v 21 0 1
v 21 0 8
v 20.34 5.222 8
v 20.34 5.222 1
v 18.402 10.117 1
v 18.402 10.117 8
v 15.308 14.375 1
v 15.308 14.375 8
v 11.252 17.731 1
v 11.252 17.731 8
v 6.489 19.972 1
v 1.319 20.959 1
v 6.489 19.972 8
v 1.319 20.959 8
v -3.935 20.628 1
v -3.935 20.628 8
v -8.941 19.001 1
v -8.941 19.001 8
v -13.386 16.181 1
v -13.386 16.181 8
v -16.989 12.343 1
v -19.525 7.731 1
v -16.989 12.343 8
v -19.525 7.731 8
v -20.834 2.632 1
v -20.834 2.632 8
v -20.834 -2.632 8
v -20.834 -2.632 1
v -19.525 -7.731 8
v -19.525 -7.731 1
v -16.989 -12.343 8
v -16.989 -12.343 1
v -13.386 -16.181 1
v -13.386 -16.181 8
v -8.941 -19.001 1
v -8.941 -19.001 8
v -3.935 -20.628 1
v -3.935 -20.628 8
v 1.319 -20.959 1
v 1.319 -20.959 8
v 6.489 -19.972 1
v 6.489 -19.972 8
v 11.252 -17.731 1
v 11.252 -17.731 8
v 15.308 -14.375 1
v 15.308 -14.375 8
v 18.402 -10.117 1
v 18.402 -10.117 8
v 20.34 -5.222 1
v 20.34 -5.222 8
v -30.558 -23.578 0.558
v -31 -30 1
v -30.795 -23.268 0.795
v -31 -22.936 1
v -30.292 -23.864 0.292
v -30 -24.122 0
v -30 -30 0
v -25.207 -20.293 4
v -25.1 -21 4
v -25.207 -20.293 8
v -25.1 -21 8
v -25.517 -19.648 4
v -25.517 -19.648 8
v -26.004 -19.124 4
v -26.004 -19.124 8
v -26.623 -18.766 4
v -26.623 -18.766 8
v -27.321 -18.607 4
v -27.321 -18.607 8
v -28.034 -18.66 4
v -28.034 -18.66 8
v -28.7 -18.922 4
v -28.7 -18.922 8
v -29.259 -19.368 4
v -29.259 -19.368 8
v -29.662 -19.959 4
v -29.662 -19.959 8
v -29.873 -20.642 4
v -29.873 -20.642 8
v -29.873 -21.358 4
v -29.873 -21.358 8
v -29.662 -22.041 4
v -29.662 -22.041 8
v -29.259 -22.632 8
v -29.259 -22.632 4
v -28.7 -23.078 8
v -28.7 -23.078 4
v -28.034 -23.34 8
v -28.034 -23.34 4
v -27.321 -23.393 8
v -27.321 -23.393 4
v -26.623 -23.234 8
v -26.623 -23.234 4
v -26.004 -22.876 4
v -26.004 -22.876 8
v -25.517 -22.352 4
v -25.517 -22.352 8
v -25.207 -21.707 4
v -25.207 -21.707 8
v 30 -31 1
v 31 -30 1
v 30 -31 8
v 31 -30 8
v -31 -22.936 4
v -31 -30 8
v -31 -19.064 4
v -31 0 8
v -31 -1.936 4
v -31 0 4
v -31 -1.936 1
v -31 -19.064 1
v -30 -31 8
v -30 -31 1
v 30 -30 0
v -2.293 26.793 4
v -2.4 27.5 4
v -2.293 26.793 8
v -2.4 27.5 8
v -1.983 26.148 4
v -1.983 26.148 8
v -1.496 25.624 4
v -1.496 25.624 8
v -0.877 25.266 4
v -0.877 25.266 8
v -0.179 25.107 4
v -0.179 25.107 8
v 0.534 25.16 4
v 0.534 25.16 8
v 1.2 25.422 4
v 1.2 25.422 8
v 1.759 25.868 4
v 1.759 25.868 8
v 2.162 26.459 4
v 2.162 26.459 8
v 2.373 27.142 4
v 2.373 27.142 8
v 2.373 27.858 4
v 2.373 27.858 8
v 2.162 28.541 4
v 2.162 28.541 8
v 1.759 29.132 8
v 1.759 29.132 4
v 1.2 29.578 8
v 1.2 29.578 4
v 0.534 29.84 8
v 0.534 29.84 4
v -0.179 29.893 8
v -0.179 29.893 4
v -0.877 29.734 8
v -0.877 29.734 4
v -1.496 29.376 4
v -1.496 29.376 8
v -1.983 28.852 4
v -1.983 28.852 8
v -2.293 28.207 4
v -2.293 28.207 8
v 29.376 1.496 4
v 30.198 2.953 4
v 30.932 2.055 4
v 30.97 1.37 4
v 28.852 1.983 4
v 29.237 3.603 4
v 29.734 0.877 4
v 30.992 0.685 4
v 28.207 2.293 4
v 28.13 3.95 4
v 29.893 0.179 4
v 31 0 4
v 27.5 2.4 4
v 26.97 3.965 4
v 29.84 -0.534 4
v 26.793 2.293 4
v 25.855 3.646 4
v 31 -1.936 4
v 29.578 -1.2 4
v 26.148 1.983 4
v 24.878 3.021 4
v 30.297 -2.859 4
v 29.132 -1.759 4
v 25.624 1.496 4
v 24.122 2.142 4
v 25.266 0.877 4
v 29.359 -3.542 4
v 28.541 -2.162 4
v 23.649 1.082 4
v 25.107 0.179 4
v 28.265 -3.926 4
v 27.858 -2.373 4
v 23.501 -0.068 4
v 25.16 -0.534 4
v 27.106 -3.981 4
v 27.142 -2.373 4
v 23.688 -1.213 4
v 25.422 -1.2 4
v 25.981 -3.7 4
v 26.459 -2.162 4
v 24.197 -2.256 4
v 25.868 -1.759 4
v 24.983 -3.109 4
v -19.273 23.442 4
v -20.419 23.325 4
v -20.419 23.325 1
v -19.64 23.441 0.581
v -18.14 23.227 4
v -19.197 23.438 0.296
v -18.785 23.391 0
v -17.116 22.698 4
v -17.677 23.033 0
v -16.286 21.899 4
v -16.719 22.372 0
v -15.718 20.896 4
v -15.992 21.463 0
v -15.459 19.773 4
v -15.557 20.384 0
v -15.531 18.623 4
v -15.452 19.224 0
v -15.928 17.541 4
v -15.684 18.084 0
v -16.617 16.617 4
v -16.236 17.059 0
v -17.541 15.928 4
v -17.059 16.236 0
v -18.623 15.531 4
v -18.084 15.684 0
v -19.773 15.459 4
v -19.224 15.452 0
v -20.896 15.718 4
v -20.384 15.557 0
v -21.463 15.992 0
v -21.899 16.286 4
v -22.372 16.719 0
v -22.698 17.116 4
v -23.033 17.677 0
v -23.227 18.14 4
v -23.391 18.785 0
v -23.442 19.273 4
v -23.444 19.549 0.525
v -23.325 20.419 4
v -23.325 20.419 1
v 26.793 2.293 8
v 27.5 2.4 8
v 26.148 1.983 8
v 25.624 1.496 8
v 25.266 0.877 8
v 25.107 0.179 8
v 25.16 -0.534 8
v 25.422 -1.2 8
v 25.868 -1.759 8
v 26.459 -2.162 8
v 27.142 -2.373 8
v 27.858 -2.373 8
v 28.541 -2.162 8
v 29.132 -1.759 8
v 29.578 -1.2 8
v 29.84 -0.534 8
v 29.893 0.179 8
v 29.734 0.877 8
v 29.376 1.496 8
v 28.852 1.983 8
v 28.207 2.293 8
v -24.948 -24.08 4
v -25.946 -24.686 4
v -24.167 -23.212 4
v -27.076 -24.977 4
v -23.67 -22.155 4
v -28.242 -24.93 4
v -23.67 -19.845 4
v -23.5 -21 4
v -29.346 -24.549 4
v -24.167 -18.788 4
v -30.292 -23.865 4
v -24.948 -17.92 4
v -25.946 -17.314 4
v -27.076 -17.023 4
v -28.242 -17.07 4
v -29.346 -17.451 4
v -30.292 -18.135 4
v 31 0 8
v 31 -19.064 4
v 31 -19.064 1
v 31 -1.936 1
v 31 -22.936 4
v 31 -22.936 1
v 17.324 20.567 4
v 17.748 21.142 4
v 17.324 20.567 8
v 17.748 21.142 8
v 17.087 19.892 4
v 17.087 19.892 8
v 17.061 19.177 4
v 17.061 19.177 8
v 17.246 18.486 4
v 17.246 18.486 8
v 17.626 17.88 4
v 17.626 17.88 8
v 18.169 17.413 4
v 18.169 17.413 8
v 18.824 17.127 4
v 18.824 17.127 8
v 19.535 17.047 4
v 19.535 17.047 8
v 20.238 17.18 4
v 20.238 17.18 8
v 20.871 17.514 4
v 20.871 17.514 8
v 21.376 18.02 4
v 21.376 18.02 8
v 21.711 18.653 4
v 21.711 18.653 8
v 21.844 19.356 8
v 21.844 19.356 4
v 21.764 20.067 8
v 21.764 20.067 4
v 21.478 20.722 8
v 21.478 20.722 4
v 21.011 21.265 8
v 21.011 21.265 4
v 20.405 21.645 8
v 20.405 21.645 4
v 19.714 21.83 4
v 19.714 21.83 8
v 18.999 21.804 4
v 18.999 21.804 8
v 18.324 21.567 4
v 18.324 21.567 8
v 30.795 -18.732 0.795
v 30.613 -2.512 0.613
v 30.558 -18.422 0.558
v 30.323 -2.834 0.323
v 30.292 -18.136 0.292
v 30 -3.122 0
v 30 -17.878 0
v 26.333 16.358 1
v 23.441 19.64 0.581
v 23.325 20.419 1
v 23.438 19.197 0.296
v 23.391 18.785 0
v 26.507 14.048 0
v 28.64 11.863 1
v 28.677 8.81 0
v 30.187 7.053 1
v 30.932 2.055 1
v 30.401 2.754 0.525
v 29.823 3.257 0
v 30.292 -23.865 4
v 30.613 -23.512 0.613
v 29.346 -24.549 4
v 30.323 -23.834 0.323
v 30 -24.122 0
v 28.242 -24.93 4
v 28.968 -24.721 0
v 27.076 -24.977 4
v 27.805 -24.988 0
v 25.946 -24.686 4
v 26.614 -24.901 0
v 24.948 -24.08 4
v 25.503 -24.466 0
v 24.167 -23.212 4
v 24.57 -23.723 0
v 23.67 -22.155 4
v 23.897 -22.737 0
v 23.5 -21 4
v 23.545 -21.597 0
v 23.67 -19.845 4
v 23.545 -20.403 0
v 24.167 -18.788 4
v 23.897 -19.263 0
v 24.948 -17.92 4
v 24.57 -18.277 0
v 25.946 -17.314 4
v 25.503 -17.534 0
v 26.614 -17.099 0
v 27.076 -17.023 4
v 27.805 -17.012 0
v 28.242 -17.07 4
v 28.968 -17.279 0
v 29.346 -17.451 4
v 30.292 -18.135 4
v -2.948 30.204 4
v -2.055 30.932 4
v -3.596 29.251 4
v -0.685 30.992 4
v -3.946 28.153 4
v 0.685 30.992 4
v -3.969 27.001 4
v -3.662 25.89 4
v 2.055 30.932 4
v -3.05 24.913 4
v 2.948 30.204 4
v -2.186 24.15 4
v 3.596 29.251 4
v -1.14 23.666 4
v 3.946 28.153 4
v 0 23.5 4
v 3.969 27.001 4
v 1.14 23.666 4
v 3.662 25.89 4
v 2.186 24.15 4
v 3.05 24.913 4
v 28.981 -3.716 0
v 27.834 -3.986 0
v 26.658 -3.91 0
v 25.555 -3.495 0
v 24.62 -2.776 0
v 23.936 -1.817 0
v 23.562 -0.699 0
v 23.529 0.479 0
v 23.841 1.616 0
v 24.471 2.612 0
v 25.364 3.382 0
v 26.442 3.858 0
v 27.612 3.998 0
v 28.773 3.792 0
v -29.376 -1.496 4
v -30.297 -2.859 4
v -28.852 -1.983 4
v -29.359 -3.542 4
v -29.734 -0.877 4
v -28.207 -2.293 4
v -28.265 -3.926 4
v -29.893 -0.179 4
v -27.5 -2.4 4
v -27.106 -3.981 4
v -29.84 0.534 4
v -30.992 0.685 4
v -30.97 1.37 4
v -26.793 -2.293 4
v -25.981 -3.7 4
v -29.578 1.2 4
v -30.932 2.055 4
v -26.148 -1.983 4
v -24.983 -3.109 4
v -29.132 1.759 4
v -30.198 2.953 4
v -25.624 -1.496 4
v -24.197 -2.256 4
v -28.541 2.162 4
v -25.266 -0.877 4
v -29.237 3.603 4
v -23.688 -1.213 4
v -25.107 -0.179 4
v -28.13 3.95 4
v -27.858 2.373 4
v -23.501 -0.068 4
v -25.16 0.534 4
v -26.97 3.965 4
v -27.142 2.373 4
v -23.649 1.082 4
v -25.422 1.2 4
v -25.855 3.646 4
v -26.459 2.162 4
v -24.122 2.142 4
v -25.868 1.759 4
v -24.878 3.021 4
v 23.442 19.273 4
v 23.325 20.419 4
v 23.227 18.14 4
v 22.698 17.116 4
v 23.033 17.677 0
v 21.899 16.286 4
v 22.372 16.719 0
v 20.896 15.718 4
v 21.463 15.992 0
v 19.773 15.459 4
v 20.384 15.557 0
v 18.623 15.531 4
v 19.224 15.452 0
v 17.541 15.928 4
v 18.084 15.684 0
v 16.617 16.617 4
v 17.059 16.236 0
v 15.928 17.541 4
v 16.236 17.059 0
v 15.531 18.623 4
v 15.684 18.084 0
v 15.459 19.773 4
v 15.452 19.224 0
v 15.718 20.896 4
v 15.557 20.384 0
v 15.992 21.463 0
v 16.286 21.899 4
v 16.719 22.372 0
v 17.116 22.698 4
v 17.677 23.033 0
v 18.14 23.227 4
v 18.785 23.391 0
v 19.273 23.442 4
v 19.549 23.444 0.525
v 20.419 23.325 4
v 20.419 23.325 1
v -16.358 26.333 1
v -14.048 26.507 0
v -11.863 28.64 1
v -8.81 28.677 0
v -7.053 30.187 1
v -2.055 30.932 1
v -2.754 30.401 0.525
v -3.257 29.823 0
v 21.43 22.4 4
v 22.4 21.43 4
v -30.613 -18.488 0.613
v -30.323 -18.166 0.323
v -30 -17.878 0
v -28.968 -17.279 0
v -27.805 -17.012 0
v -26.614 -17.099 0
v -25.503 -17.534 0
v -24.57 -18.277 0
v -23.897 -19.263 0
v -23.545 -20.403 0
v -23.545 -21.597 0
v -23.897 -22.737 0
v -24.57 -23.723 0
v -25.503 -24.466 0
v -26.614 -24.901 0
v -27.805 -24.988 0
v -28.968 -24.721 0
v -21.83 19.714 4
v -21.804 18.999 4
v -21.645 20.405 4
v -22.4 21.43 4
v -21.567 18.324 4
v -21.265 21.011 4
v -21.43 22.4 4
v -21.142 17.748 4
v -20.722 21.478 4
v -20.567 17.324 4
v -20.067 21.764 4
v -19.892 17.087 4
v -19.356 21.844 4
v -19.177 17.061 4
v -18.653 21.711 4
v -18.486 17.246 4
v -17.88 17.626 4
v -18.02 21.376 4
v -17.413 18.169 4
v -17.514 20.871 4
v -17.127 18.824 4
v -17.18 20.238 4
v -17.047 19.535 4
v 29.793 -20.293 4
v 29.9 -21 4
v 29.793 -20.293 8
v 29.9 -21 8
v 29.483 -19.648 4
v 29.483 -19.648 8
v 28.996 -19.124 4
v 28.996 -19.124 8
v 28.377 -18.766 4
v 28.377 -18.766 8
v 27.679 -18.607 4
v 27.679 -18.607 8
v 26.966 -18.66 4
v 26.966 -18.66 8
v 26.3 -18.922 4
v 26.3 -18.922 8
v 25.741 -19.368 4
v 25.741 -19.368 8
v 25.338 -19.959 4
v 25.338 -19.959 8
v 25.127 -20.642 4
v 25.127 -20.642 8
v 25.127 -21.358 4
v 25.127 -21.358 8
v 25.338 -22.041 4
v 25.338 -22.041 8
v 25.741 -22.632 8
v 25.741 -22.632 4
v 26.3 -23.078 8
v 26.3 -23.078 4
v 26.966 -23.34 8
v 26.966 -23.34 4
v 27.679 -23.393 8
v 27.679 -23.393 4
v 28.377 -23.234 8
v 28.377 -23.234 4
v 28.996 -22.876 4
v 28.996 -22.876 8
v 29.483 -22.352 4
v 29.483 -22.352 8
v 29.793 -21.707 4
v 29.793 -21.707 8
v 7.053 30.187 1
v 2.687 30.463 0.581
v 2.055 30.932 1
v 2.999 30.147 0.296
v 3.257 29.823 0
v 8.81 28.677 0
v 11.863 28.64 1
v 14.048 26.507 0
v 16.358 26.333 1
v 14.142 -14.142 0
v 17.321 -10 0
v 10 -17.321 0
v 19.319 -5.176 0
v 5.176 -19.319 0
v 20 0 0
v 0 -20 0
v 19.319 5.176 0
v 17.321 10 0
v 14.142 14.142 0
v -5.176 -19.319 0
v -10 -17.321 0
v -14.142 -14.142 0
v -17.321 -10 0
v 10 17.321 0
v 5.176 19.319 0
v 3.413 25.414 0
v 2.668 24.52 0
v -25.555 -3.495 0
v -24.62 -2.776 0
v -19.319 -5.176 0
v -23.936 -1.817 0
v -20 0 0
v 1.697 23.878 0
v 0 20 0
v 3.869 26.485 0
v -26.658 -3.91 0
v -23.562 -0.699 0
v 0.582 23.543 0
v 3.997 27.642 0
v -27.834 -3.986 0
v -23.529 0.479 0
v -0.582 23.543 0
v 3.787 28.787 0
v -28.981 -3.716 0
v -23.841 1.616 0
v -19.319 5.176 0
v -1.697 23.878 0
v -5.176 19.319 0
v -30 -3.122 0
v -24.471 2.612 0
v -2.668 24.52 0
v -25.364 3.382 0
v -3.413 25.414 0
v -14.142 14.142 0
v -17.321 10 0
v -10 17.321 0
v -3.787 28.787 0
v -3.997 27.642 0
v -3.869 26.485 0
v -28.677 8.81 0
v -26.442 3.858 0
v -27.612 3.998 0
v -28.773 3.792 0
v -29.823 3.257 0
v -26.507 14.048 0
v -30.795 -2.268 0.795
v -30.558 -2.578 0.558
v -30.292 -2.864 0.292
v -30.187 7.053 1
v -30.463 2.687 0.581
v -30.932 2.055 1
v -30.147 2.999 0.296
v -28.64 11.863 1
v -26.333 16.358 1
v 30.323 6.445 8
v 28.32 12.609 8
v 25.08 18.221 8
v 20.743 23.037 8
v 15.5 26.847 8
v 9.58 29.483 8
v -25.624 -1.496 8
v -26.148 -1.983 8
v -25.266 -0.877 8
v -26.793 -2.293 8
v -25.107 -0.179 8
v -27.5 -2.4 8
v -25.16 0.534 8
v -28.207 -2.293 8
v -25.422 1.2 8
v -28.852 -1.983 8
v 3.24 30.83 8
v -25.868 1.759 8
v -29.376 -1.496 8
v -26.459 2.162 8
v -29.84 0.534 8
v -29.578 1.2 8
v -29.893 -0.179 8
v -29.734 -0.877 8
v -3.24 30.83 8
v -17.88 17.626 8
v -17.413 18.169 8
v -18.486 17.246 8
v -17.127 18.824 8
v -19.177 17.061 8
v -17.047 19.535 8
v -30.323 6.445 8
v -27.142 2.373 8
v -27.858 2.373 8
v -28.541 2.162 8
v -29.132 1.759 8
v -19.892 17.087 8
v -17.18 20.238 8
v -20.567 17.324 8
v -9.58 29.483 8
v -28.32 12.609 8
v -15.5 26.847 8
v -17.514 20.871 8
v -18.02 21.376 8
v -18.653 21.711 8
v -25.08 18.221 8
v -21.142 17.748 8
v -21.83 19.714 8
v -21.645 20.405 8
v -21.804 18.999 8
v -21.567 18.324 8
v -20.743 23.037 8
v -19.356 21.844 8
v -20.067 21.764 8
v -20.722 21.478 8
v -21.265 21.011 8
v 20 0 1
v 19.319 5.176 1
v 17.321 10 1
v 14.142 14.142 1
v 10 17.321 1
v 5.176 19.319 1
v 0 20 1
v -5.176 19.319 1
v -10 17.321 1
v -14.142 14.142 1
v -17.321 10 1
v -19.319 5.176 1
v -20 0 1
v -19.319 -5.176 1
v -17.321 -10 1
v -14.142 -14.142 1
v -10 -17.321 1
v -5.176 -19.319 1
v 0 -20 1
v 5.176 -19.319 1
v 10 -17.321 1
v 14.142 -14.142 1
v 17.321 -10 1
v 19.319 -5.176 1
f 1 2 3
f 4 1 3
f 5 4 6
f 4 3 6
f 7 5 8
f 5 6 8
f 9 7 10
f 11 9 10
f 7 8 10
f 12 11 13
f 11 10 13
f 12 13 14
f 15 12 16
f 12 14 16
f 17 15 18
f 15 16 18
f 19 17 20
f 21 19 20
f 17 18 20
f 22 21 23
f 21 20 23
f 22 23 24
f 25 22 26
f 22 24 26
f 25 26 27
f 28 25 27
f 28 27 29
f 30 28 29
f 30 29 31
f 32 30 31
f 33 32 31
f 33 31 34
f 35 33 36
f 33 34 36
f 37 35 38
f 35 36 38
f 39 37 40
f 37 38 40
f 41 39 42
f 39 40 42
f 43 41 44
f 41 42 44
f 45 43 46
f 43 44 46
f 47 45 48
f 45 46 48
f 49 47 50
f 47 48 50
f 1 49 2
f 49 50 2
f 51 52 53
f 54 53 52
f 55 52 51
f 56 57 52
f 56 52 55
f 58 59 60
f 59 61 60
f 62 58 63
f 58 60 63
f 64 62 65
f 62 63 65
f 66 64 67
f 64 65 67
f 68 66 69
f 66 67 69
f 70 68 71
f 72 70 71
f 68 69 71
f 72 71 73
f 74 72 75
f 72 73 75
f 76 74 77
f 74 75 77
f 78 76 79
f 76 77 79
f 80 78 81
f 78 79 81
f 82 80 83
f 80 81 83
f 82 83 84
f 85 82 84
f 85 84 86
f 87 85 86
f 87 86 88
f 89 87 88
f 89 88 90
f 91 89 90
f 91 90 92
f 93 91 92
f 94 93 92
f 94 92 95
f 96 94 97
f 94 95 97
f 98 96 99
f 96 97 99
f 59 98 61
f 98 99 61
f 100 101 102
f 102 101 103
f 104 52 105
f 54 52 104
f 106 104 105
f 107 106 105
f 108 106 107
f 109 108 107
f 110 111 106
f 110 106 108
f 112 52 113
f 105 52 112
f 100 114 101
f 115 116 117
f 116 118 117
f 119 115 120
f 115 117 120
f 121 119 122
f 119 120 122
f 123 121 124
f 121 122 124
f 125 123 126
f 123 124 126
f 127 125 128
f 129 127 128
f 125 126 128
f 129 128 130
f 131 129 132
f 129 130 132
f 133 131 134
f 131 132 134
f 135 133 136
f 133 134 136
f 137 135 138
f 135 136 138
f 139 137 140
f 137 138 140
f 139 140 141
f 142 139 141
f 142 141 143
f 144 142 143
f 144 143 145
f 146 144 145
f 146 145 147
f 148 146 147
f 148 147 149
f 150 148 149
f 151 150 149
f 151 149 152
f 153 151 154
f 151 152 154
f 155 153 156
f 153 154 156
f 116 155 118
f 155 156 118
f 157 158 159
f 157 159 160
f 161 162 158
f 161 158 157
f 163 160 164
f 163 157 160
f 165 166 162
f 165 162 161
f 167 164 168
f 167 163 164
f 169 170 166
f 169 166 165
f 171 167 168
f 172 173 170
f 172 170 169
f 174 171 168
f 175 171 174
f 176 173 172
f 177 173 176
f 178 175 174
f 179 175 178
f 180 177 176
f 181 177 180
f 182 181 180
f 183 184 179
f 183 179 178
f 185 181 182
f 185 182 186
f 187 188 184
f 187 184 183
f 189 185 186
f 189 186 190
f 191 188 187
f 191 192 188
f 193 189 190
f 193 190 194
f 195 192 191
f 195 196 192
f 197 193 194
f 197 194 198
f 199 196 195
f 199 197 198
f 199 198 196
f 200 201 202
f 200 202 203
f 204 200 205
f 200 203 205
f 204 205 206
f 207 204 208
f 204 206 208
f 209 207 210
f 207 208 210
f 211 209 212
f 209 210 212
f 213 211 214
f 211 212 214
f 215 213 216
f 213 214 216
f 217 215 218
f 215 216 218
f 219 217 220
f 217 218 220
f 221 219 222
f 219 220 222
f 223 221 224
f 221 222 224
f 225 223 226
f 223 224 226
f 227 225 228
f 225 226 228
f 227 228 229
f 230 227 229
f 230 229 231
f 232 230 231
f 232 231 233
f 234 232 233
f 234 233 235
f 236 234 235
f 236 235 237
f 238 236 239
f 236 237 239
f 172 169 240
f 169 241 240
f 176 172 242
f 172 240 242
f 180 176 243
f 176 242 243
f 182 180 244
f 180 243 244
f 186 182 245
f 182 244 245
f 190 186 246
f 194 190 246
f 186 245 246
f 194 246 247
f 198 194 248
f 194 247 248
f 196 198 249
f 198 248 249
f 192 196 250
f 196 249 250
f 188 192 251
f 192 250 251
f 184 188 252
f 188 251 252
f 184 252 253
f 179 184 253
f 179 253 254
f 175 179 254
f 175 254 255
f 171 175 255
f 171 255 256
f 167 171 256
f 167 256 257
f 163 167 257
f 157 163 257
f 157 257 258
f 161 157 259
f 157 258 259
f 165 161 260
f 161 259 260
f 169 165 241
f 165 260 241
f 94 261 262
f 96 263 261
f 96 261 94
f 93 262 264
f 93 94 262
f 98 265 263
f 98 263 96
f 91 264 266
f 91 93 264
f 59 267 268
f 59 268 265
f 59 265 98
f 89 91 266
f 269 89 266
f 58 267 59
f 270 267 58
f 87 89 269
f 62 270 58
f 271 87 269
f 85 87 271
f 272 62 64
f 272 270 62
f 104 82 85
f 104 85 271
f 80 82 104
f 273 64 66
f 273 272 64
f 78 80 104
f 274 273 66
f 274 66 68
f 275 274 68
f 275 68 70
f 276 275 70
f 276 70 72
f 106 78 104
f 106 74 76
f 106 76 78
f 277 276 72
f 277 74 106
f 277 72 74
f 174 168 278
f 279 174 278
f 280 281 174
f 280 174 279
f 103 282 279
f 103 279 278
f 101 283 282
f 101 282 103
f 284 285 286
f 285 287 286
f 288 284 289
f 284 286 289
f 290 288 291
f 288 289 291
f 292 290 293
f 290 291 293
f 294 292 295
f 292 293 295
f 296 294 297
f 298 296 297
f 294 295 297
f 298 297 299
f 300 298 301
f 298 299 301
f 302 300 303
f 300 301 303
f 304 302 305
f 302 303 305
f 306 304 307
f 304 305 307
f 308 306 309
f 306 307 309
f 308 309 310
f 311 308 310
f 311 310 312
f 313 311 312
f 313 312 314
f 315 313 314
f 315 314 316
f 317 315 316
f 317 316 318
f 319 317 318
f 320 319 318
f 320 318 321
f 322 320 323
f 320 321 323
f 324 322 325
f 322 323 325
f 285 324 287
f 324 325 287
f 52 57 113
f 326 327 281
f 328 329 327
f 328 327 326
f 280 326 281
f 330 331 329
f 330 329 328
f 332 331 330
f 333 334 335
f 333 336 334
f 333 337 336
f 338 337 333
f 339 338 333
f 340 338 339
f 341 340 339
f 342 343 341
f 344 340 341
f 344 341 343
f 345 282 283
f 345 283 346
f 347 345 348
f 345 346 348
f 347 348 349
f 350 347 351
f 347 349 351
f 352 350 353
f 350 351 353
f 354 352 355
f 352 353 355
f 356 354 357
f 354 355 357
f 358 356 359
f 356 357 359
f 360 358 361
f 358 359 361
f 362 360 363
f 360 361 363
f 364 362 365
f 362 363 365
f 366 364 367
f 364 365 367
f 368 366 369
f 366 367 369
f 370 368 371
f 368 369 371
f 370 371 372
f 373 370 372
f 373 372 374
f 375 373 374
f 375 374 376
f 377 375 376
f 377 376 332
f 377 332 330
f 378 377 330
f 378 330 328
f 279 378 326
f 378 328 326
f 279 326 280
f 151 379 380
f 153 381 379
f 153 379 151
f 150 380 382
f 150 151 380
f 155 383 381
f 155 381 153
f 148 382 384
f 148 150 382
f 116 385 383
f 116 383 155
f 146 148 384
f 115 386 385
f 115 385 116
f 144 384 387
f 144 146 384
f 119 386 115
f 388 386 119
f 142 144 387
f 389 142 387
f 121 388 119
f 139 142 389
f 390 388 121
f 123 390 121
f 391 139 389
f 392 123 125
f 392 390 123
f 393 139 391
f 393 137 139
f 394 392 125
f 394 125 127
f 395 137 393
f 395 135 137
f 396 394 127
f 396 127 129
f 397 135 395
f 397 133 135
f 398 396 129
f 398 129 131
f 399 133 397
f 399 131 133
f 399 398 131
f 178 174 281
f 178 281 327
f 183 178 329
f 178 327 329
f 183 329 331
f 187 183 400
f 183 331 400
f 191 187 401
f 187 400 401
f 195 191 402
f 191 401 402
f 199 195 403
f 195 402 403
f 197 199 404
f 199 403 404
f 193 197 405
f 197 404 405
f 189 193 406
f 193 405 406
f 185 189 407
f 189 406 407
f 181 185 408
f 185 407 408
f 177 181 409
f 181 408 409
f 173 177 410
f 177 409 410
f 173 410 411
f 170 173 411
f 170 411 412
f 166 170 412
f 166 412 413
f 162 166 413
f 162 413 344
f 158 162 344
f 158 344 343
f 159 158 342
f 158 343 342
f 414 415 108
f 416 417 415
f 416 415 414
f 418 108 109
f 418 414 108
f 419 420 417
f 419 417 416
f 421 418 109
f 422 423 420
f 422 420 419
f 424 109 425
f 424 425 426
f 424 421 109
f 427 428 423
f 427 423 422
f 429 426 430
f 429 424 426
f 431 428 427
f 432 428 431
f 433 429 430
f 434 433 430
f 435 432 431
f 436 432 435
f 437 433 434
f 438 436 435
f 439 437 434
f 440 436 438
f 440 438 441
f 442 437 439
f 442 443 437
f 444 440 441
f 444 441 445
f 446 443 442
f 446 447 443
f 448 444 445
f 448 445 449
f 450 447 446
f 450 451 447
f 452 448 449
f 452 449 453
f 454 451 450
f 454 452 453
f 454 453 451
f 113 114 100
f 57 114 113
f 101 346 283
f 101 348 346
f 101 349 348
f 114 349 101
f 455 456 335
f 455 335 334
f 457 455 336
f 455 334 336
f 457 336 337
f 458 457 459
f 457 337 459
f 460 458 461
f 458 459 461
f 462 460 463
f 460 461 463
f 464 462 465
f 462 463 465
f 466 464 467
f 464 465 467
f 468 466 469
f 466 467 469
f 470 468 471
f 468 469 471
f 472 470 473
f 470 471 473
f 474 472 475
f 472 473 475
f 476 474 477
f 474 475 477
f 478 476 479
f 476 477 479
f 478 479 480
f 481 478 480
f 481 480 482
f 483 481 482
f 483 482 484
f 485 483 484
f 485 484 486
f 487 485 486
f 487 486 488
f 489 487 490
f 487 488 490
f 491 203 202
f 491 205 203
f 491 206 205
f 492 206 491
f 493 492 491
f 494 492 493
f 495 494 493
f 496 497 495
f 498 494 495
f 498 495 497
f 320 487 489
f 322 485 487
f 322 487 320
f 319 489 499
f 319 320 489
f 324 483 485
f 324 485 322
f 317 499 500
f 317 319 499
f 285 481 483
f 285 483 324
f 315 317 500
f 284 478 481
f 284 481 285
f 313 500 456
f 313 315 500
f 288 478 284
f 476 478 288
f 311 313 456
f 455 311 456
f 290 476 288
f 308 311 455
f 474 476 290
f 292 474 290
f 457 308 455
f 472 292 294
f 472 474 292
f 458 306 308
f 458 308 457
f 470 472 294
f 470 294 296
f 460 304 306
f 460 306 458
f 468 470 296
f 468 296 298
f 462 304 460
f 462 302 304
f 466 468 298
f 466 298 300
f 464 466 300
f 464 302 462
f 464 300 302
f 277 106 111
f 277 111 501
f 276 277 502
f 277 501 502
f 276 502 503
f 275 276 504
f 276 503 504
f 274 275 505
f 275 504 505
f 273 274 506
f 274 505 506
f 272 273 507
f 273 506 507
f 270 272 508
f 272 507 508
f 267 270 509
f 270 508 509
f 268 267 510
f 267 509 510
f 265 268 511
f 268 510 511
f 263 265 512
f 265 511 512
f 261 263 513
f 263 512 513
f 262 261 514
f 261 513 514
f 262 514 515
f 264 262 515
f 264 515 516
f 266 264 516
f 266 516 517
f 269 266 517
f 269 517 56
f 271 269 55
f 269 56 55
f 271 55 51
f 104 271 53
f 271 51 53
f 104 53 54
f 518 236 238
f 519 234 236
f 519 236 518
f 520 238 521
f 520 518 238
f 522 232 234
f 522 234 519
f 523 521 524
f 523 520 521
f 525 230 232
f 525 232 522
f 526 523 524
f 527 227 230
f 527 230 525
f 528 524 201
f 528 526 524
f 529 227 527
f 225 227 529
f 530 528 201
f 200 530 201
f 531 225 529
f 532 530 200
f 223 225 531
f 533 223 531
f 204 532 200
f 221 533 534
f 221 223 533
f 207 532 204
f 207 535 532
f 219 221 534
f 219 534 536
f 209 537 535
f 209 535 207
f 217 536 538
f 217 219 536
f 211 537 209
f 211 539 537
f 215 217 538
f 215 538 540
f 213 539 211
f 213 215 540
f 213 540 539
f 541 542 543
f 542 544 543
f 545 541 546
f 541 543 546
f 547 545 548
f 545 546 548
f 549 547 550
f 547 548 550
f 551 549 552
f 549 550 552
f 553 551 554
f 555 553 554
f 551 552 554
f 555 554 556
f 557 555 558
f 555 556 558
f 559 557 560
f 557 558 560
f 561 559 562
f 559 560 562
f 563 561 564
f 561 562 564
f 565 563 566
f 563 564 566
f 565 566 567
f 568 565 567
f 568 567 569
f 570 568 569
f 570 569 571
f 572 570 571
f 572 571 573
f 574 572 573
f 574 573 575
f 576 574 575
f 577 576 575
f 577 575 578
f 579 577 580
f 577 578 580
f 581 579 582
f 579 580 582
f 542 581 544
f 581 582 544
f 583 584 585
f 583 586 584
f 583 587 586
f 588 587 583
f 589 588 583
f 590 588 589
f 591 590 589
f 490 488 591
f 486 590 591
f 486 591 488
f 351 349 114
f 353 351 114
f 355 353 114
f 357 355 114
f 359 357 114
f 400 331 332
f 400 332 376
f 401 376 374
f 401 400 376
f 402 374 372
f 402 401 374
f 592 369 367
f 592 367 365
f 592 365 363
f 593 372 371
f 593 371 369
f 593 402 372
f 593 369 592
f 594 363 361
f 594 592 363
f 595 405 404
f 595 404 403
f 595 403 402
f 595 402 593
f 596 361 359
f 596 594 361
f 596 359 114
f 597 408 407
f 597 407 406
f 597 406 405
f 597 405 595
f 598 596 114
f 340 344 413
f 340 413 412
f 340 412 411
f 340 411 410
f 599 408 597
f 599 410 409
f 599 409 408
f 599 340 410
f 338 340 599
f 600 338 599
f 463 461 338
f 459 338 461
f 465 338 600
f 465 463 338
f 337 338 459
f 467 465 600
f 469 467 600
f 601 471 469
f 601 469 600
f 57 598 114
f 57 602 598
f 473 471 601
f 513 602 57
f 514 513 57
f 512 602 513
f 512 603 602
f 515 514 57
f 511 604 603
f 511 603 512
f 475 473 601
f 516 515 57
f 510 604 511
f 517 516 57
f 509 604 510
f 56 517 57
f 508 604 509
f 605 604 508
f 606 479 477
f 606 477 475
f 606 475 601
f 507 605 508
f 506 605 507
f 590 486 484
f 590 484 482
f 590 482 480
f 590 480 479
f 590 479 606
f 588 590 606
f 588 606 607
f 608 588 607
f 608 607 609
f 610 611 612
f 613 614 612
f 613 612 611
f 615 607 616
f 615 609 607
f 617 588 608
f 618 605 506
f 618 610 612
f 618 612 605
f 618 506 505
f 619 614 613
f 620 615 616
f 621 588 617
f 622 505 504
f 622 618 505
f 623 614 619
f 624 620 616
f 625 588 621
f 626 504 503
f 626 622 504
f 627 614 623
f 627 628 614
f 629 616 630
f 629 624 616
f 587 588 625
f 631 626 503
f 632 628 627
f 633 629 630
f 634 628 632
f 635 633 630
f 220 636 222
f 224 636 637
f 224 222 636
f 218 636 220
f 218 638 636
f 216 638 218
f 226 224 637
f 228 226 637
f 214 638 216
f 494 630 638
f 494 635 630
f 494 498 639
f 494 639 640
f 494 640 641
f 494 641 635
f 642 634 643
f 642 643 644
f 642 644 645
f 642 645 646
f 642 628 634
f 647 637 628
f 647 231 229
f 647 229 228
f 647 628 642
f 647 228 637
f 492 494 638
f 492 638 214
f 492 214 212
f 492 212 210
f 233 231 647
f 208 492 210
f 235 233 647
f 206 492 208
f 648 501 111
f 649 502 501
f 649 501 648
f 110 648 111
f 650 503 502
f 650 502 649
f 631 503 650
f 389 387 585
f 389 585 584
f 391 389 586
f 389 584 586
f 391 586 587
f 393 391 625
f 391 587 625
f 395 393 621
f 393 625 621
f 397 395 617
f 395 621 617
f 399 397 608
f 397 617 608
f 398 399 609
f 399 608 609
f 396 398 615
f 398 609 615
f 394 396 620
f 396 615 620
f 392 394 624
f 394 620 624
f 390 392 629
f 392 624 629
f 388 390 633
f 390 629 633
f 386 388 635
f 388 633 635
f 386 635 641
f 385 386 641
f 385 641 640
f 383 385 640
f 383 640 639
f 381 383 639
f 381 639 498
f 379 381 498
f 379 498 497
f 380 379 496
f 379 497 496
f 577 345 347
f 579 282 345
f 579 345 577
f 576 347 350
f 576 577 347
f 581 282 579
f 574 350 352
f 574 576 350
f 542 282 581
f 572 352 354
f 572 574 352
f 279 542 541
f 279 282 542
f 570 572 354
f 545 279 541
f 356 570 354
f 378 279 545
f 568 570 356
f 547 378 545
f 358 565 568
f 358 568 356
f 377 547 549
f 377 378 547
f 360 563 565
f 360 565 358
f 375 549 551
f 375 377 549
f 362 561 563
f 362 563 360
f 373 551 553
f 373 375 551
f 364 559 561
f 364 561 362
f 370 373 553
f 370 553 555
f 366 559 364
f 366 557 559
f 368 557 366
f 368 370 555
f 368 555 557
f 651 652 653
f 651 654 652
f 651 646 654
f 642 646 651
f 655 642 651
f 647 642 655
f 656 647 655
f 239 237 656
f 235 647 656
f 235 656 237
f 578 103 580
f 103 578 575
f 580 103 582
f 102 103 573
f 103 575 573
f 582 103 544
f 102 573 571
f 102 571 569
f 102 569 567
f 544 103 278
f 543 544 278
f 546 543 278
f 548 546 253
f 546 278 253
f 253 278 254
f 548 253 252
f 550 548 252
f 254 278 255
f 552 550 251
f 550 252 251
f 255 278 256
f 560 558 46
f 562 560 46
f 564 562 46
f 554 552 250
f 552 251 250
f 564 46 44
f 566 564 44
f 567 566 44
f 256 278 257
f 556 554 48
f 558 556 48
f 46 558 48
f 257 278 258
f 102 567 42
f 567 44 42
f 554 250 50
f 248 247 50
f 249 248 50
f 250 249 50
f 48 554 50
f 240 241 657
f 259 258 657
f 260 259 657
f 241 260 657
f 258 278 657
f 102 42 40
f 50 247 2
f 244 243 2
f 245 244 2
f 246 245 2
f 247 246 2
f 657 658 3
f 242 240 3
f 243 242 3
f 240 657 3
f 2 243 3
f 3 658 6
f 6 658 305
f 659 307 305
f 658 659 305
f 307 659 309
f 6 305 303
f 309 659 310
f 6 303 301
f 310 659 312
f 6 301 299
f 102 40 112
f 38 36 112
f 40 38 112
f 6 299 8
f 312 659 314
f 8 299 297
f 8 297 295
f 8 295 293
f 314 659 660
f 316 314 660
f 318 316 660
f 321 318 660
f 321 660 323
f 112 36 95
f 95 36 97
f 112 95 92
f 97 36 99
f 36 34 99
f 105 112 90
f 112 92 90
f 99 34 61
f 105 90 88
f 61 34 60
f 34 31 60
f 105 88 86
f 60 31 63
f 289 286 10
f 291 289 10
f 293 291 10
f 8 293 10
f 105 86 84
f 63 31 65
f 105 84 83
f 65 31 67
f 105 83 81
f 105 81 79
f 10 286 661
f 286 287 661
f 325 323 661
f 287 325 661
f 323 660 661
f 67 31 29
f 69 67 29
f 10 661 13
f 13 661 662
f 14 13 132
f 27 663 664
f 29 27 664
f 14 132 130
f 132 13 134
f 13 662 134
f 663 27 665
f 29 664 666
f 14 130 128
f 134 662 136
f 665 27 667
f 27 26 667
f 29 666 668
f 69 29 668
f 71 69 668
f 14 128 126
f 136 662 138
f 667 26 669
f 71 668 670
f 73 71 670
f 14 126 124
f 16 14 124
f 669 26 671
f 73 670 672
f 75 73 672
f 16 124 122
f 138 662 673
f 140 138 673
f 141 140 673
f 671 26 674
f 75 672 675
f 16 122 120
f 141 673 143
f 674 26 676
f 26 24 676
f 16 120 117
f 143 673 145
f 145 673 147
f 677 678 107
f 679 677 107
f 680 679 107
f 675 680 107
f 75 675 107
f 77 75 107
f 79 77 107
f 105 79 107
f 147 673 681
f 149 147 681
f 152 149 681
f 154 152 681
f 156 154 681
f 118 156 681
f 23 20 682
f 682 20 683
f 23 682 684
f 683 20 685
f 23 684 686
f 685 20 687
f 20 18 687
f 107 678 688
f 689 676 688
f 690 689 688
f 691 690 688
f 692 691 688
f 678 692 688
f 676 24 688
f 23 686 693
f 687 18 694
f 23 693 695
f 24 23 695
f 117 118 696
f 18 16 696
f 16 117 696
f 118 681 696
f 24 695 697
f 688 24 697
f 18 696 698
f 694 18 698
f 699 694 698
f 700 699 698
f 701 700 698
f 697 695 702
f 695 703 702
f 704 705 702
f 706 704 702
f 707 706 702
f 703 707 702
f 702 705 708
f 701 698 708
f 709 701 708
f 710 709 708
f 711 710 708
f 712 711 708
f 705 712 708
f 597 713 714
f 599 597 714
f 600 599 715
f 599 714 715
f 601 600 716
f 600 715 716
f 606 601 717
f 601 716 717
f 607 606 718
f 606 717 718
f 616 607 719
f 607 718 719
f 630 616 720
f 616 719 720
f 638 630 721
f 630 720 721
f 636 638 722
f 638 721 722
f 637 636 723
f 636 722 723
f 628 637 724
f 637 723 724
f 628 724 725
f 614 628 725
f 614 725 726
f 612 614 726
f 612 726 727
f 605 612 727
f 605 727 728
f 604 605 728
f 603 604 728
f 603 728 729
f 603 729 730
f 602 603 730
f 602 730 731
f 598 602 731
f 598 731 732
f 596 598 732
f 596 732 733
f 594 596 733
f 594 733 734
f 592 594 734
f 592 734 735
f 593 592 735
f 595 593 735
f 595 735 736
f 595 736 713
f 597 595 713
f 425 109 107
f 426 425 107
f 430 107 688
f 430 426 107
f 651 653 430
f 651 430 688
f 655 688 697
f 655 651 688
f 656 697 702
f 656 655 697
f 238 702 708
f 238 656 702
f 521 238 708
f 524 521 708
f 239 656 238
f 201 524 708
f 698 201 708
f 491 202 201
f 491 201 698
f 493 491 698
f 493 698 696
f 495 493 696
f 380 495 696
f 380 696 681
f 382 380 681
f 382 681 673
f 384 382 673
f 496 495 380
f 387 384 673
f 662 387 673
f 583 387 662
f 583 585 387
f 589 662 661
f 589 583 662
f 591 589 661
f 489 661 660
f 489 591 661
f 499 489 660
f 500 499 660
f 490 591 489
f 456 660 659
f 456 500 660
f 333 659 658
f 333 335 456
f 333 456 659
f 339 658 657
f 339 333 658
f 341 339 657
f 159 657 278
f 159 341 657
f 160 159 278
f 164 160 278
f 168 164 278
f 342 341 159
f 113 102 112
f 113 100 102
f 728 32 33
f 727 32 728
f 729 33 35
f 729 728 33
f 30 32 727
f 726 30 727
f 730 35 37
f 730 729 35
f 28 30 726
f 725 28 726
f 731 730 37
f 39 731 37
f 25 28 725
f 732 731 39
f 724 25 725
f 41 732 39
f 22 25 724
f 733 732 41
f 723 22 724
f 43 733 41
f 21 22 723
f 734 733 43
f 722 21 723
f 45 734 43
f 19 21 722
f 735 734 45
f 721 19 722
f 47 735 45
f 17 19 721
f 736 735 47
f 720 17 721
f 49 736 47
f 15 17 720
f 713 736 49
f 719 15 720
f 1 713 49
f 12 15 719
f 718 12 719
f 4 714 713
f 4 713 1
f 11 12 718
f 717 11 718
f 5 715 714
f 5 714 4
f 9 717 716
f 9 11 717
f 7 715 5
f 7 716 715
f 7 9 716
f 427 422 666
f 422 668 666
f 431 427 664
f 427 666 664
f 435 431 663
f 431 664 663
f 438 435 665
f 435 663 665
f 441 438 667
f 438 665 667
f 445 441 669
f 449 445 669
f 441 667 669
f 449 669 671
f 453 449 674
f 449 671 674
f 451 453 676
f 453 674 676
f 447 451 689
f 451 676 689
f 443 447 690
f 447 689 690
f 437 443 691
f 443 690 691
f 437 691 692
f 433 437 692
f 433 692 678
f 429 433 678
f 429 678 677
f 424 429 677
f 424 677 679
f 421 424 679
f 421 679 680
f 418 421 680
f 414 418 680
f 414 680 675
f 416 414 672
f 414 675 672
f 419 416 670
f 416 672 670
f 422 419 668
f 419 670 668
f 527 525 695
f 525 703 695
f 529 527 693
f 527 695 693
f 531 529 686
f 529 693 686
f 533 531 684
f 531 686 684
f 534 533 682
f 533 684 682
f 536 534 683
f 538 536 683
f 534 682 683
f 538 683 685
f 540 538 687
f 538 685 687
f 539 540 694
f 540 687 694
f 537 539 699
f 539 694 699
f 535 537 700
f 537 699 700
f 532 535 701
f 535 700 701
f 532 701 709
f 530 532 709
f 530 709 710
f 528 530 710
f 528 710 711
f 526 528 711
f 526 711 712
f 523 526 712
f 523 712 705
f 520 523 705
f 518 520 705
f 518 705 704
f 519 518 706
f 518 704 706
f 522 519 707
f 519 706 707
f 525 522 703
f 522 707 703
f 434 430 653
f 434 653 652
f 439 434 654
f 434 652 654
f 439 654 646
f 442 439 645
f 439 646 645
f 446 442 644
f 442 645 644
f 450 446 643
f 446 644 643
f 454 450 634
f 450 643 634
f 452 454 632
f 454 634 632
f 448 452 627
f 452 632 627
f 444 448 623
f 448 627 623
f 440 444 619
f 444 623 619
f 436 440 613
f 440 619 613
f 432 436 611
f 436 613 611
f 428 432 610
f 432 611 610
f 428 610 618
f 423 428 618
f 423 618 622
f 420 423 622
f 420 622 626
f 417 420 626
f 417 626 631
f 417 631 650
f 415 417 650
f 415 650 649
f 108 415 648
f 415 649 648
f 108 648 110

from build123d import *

# Parameters (mm, degrees)
EXTRUDE_1_DEPTH              = 8
CHAMFER_1_SIZE               = 1
HOLE_WIZARD_M4_1_D           = 4.8
HOLE_WIZARD_M4_1_CBORE_D     = 8
HOLE_WIZARD_M4_1_CBORE_DEPTH = 4
PATTERN_CIRCULAR_1_COUNT     = 8
SKETCH_11_R                  = 21
CUT_EXTRUDE_8_DEPTH          = 7
SKETCH_12_R                  = 20
CUT_EXTRUDE_9_DEPTH          = 2.0000001
HOLE_WIZARD_M4_2_D           = 4.8
HOLE_WIZARD_M4_2_CBORE_D     = 8
HOLE_WIZARD_M4_2_CBORE_DEPTH = 4


with BuildPart() as part:
    # ｽｹｯﾁ1 → ﾎﾞｽ - 押し出し1 (new body)
    with BuildSketch(Plane.XY):
        with BuildLine():
            Line((31, -31), (-31, -31))
            Line((-31, -31), (-31, 0))
            ThreePointArc((-31, 0), (0, 31), (31, 0))
            Line((31, 0), (31, -31))
        make_face()
    extrude(amount=EXTRUDE_1_DEPTH)

    # 面取り1
    chamfer_1_edges = [part.edges().sort_by_distance(p)[0] for p in [
        (31, -15.5, 0),
        (0, -31, 0),
        (-31, -15.5, 0),
        (0, 31, 0),
        (31, -31, 4),
        (-31, -31, 4),
    ]]
    chamfer(chamfer_1_edges, length=CHAMFER_1_SIZE)

    # M4 穴付きねじ用座ぐり穴1 (through all)
    with Locations(Plane(origin=(0, 0, 0), x_dir=(1, 0, 0), z_dir=(0, 0, -1))):
        with Locations((0, -27.5)):
            hole_wizard_m4_1 = CounterBoreHole(HOLE_WIZARD_M4_1_D / 2, HOLE_WIZARD_M4_1_CBORE_D / 2, HOLE_WIZARD_M4_1_CBORE_DEPTH)

    # 円形ﾊﾟﾀｰﾝ1: M4 穴付きねじ用座ぐり穴1 ×8 about axis, 3 skipped
    pattern_circular_1_axis = Axis((0, 0, 0), (0, 0, -1))
    add([hole_wizard_m4_1.rotate(pattern_circular_1_axis, i * 360 / PATTERN_CIRCULAR_1_COUNT) for i in range(1, PATTERN_CIRCULAR_1_COUNT) if i not in (3, 4, 5)], mode=Mode.SUBTRACT)

    # ｽｹｯﾁ11 → ｶｯﾄ - 押し出し8 (cut)
    with BuildSketch(Plane.XY.offset(8)):
        Circle(SKETCH_11_R)
    extrude(amount=-CUT_EXTRUDE_8_DEPTH, mode=Mode.SUBTRACT)

    # ｽｹｯﾁ12 → ｶｯﾄ - 押し出し9 (cut, through all)
    with BuildSketch(Plane.XY.offset(1)):
        Circle(SKETCH_12_R)
    extrude(amount=-CUT_EXTRUDE_9_DEPTH, mode=Mode.SUBTRACT)

    # M4 穴付きねじ用座ぐり穴2 (through all)
    with Locations(Plane(origin=(0, 0, 0), x_dir=(-1, 0, 0), z_dir=(0, 0, -1))):
        with Locations((27.5, -21), (-27.5, -21)):
            CounterBoreHole(HOLE_WIZARD_M4_2_D / 2, HOLE_WIZARD_M4_2_CBORE_D / 2, HOLE_WIZARD_M4_2_CBORE_DEPTH)


solid = part.part
